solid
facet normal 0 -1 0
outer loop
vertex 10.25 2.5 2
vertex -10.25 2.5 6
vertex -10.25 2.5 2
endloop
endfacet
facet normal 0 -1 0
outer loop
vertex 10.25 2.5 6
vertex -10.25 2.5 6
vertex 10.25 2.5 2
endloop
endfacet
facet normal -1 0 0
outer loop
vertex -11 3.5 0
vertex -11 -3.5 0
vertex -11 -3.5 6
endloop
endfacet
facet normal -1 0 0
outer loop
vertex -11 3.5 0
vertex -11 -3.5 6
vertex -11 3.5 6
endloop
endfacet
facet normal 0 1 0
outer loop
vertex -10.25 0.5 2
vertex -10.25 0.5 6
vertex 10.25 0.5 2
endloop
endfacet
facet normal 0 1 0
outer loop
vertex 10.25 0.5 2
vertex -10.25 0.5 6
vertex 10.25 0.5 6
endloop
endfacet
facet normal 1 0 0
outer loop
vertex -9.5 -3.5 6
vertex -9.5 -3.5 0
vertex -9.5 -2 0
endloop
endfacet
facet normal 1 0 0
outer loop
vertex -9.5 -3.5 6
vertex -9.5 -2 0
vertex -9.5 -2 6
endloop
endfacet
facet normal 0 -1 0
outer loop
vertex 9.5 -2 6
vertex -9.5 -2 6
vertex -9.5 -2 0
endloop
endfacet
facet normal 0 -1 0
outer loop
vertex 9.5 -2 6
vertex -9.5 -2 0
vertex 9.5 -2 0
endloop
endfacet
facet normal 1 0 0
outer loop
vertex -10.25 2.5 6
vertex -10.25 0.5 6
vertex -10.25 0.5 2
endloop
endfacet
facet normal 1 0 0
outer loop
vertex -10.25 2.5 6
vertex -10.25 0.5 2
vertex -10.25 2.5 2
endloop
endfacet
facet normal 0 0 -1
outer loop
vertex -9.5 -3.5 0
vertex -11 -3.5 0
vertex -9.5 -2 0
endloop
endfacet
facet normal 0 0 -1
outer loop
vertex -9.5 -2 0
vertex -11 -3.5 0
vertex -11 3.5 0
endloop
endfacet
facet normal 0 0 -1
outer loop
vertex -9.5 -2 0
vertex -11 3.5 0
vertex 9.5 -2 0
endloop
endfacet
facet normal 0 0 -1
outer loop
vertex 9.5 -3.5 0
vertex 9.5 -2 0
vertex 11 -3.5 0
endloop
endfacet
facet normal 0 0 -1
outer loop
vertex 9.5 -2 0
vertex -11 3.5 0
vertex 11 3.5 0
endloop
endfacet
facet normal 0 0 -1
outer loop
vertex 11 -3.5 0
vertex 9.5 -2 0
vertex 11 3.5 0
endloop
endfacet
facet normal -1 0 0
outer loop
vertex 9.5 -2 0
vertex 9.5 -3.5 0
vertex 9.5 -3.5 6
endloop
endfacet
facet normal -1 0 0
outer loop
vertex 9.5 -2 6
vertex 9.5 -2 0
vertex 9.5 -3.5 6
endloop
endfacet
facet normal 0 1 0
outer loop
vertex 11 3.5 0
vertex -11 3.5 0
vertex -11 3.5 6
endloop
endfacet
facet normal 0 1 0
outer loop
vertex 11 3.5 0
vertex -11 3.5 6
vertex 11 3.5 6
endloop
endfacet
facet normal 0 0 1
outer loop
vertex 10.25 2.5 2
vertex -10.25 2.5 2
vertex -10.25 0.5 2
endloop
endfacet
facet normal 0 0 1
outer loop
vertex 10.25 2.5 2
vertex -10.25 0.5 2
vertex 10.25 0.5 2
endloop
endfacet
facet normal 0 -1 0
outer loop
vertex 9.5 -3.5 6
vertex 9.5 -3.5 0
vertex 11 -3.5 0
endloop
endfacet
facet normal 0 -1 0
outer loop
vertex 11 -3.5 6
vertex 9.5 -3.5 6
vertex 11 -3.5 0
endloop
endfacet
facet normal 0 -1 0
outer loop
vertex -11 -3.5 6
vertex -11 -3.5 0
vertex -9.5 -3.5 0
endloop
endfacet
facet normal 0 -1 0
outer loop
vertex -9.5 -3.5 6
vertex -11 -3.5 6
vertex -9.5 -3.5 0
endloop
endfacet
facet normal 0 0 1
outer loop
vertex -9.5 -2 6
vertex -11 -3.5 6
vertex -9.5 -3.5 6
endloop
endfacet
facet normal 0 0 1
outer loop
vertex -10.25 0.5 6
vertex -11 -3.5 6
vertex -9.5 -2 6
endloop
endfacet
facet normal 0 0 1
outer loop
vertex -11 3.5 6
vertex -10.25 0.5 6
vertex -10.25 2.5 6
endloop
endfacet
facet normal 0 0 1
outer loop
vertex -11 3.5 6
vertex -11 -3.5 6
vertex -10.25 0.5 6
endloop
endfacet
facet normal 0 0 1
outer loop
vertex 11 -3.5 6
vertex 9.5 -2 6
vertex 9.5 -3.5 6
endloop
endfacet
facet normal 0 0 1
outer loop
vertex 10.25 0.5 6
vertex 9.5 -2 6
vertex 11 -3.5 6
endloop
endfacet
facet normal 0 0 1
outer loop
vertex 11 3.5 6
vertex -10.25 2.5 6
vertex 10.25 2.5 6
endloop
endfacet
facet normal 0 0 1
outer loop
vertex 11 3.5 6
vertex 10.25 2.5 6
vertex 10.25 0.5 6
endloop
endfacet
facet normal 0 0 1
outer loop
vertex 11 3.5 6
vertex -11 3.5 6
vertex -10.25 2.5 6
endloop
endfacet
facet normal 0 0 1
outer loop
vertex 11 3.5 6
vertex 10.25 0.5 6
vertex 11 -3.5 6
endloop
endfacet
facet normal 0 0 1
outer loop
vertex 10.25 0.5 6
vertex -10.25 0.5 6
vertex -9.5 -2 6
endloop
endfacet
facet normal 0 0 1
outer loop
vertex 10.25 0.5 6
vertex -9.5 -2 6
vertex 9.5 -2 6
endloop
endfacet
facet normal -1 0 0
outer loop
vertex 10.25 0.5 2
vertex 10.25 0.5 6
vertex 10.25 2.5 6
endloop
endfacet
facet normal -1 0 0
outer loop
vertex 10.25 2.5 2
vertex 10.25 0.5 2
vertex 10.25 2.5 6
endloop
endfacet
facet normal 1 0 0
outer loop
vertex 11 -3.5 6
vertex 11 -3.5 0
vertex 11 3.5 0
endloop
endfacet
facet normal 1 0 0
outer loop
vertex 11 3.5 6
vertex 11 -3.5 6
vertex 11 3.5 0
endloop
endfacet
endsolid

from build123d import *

# Parameters (mm, degrees)
F0_W     = 22
F0_H     = 7
F1_DEPTH = 6
F2_W     = 20.5
F2_H     = 2
F3_DEPTH = 4
F4_W     = 19
F4_H     = 6
F5_DEPTH = 1.5


with BuildPart() as f1:
    # F0 (on Top) → F1 (new body)
    with BuildSketch(Plane.XY):
        Rectangle(F0_W, F0_H)
    extrude(amount=F1_DEPTH)

    # F2 (on face) → F3 (cut)
    with BuildSketch(Plane.XY.offset(6)):
        with Locations((0, 1.5)):
            Rectangle(F2_W, F2_H)
    extrude(amount=-F3_DEPTH, mode=Mode.SUBTRACT)

    # F4 (on face) → F5 (cut)
    with BuildSketch(Plane.XZ.offset(3.5)):
        with Locations((0, 3)):
            Rectangle(F4_W, F4_H)
    extrude(amount=-F5_DEPTH, mode=Mode.SUBTRACT)


solid = f1.part
